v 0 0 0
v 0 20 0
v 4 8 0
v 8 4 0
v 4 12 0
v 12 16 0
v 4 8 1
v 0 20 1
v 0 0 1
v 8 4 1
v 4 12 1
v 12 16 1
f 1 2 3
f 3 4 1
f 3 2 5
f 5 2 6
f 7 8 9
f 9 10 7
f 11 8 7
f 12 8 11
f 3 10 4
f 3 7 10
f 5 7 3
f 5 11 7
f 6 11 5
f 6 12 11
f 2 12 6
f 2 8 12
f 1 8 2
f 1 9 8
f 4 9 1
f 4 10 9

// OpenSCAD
linear_extrude(1)
    polygon(points=[[0,0],[8,4],[4,8],[4,12],[12,16],[0,20]], paths=[[0,1,2,3,4,5]], convexity=3);
